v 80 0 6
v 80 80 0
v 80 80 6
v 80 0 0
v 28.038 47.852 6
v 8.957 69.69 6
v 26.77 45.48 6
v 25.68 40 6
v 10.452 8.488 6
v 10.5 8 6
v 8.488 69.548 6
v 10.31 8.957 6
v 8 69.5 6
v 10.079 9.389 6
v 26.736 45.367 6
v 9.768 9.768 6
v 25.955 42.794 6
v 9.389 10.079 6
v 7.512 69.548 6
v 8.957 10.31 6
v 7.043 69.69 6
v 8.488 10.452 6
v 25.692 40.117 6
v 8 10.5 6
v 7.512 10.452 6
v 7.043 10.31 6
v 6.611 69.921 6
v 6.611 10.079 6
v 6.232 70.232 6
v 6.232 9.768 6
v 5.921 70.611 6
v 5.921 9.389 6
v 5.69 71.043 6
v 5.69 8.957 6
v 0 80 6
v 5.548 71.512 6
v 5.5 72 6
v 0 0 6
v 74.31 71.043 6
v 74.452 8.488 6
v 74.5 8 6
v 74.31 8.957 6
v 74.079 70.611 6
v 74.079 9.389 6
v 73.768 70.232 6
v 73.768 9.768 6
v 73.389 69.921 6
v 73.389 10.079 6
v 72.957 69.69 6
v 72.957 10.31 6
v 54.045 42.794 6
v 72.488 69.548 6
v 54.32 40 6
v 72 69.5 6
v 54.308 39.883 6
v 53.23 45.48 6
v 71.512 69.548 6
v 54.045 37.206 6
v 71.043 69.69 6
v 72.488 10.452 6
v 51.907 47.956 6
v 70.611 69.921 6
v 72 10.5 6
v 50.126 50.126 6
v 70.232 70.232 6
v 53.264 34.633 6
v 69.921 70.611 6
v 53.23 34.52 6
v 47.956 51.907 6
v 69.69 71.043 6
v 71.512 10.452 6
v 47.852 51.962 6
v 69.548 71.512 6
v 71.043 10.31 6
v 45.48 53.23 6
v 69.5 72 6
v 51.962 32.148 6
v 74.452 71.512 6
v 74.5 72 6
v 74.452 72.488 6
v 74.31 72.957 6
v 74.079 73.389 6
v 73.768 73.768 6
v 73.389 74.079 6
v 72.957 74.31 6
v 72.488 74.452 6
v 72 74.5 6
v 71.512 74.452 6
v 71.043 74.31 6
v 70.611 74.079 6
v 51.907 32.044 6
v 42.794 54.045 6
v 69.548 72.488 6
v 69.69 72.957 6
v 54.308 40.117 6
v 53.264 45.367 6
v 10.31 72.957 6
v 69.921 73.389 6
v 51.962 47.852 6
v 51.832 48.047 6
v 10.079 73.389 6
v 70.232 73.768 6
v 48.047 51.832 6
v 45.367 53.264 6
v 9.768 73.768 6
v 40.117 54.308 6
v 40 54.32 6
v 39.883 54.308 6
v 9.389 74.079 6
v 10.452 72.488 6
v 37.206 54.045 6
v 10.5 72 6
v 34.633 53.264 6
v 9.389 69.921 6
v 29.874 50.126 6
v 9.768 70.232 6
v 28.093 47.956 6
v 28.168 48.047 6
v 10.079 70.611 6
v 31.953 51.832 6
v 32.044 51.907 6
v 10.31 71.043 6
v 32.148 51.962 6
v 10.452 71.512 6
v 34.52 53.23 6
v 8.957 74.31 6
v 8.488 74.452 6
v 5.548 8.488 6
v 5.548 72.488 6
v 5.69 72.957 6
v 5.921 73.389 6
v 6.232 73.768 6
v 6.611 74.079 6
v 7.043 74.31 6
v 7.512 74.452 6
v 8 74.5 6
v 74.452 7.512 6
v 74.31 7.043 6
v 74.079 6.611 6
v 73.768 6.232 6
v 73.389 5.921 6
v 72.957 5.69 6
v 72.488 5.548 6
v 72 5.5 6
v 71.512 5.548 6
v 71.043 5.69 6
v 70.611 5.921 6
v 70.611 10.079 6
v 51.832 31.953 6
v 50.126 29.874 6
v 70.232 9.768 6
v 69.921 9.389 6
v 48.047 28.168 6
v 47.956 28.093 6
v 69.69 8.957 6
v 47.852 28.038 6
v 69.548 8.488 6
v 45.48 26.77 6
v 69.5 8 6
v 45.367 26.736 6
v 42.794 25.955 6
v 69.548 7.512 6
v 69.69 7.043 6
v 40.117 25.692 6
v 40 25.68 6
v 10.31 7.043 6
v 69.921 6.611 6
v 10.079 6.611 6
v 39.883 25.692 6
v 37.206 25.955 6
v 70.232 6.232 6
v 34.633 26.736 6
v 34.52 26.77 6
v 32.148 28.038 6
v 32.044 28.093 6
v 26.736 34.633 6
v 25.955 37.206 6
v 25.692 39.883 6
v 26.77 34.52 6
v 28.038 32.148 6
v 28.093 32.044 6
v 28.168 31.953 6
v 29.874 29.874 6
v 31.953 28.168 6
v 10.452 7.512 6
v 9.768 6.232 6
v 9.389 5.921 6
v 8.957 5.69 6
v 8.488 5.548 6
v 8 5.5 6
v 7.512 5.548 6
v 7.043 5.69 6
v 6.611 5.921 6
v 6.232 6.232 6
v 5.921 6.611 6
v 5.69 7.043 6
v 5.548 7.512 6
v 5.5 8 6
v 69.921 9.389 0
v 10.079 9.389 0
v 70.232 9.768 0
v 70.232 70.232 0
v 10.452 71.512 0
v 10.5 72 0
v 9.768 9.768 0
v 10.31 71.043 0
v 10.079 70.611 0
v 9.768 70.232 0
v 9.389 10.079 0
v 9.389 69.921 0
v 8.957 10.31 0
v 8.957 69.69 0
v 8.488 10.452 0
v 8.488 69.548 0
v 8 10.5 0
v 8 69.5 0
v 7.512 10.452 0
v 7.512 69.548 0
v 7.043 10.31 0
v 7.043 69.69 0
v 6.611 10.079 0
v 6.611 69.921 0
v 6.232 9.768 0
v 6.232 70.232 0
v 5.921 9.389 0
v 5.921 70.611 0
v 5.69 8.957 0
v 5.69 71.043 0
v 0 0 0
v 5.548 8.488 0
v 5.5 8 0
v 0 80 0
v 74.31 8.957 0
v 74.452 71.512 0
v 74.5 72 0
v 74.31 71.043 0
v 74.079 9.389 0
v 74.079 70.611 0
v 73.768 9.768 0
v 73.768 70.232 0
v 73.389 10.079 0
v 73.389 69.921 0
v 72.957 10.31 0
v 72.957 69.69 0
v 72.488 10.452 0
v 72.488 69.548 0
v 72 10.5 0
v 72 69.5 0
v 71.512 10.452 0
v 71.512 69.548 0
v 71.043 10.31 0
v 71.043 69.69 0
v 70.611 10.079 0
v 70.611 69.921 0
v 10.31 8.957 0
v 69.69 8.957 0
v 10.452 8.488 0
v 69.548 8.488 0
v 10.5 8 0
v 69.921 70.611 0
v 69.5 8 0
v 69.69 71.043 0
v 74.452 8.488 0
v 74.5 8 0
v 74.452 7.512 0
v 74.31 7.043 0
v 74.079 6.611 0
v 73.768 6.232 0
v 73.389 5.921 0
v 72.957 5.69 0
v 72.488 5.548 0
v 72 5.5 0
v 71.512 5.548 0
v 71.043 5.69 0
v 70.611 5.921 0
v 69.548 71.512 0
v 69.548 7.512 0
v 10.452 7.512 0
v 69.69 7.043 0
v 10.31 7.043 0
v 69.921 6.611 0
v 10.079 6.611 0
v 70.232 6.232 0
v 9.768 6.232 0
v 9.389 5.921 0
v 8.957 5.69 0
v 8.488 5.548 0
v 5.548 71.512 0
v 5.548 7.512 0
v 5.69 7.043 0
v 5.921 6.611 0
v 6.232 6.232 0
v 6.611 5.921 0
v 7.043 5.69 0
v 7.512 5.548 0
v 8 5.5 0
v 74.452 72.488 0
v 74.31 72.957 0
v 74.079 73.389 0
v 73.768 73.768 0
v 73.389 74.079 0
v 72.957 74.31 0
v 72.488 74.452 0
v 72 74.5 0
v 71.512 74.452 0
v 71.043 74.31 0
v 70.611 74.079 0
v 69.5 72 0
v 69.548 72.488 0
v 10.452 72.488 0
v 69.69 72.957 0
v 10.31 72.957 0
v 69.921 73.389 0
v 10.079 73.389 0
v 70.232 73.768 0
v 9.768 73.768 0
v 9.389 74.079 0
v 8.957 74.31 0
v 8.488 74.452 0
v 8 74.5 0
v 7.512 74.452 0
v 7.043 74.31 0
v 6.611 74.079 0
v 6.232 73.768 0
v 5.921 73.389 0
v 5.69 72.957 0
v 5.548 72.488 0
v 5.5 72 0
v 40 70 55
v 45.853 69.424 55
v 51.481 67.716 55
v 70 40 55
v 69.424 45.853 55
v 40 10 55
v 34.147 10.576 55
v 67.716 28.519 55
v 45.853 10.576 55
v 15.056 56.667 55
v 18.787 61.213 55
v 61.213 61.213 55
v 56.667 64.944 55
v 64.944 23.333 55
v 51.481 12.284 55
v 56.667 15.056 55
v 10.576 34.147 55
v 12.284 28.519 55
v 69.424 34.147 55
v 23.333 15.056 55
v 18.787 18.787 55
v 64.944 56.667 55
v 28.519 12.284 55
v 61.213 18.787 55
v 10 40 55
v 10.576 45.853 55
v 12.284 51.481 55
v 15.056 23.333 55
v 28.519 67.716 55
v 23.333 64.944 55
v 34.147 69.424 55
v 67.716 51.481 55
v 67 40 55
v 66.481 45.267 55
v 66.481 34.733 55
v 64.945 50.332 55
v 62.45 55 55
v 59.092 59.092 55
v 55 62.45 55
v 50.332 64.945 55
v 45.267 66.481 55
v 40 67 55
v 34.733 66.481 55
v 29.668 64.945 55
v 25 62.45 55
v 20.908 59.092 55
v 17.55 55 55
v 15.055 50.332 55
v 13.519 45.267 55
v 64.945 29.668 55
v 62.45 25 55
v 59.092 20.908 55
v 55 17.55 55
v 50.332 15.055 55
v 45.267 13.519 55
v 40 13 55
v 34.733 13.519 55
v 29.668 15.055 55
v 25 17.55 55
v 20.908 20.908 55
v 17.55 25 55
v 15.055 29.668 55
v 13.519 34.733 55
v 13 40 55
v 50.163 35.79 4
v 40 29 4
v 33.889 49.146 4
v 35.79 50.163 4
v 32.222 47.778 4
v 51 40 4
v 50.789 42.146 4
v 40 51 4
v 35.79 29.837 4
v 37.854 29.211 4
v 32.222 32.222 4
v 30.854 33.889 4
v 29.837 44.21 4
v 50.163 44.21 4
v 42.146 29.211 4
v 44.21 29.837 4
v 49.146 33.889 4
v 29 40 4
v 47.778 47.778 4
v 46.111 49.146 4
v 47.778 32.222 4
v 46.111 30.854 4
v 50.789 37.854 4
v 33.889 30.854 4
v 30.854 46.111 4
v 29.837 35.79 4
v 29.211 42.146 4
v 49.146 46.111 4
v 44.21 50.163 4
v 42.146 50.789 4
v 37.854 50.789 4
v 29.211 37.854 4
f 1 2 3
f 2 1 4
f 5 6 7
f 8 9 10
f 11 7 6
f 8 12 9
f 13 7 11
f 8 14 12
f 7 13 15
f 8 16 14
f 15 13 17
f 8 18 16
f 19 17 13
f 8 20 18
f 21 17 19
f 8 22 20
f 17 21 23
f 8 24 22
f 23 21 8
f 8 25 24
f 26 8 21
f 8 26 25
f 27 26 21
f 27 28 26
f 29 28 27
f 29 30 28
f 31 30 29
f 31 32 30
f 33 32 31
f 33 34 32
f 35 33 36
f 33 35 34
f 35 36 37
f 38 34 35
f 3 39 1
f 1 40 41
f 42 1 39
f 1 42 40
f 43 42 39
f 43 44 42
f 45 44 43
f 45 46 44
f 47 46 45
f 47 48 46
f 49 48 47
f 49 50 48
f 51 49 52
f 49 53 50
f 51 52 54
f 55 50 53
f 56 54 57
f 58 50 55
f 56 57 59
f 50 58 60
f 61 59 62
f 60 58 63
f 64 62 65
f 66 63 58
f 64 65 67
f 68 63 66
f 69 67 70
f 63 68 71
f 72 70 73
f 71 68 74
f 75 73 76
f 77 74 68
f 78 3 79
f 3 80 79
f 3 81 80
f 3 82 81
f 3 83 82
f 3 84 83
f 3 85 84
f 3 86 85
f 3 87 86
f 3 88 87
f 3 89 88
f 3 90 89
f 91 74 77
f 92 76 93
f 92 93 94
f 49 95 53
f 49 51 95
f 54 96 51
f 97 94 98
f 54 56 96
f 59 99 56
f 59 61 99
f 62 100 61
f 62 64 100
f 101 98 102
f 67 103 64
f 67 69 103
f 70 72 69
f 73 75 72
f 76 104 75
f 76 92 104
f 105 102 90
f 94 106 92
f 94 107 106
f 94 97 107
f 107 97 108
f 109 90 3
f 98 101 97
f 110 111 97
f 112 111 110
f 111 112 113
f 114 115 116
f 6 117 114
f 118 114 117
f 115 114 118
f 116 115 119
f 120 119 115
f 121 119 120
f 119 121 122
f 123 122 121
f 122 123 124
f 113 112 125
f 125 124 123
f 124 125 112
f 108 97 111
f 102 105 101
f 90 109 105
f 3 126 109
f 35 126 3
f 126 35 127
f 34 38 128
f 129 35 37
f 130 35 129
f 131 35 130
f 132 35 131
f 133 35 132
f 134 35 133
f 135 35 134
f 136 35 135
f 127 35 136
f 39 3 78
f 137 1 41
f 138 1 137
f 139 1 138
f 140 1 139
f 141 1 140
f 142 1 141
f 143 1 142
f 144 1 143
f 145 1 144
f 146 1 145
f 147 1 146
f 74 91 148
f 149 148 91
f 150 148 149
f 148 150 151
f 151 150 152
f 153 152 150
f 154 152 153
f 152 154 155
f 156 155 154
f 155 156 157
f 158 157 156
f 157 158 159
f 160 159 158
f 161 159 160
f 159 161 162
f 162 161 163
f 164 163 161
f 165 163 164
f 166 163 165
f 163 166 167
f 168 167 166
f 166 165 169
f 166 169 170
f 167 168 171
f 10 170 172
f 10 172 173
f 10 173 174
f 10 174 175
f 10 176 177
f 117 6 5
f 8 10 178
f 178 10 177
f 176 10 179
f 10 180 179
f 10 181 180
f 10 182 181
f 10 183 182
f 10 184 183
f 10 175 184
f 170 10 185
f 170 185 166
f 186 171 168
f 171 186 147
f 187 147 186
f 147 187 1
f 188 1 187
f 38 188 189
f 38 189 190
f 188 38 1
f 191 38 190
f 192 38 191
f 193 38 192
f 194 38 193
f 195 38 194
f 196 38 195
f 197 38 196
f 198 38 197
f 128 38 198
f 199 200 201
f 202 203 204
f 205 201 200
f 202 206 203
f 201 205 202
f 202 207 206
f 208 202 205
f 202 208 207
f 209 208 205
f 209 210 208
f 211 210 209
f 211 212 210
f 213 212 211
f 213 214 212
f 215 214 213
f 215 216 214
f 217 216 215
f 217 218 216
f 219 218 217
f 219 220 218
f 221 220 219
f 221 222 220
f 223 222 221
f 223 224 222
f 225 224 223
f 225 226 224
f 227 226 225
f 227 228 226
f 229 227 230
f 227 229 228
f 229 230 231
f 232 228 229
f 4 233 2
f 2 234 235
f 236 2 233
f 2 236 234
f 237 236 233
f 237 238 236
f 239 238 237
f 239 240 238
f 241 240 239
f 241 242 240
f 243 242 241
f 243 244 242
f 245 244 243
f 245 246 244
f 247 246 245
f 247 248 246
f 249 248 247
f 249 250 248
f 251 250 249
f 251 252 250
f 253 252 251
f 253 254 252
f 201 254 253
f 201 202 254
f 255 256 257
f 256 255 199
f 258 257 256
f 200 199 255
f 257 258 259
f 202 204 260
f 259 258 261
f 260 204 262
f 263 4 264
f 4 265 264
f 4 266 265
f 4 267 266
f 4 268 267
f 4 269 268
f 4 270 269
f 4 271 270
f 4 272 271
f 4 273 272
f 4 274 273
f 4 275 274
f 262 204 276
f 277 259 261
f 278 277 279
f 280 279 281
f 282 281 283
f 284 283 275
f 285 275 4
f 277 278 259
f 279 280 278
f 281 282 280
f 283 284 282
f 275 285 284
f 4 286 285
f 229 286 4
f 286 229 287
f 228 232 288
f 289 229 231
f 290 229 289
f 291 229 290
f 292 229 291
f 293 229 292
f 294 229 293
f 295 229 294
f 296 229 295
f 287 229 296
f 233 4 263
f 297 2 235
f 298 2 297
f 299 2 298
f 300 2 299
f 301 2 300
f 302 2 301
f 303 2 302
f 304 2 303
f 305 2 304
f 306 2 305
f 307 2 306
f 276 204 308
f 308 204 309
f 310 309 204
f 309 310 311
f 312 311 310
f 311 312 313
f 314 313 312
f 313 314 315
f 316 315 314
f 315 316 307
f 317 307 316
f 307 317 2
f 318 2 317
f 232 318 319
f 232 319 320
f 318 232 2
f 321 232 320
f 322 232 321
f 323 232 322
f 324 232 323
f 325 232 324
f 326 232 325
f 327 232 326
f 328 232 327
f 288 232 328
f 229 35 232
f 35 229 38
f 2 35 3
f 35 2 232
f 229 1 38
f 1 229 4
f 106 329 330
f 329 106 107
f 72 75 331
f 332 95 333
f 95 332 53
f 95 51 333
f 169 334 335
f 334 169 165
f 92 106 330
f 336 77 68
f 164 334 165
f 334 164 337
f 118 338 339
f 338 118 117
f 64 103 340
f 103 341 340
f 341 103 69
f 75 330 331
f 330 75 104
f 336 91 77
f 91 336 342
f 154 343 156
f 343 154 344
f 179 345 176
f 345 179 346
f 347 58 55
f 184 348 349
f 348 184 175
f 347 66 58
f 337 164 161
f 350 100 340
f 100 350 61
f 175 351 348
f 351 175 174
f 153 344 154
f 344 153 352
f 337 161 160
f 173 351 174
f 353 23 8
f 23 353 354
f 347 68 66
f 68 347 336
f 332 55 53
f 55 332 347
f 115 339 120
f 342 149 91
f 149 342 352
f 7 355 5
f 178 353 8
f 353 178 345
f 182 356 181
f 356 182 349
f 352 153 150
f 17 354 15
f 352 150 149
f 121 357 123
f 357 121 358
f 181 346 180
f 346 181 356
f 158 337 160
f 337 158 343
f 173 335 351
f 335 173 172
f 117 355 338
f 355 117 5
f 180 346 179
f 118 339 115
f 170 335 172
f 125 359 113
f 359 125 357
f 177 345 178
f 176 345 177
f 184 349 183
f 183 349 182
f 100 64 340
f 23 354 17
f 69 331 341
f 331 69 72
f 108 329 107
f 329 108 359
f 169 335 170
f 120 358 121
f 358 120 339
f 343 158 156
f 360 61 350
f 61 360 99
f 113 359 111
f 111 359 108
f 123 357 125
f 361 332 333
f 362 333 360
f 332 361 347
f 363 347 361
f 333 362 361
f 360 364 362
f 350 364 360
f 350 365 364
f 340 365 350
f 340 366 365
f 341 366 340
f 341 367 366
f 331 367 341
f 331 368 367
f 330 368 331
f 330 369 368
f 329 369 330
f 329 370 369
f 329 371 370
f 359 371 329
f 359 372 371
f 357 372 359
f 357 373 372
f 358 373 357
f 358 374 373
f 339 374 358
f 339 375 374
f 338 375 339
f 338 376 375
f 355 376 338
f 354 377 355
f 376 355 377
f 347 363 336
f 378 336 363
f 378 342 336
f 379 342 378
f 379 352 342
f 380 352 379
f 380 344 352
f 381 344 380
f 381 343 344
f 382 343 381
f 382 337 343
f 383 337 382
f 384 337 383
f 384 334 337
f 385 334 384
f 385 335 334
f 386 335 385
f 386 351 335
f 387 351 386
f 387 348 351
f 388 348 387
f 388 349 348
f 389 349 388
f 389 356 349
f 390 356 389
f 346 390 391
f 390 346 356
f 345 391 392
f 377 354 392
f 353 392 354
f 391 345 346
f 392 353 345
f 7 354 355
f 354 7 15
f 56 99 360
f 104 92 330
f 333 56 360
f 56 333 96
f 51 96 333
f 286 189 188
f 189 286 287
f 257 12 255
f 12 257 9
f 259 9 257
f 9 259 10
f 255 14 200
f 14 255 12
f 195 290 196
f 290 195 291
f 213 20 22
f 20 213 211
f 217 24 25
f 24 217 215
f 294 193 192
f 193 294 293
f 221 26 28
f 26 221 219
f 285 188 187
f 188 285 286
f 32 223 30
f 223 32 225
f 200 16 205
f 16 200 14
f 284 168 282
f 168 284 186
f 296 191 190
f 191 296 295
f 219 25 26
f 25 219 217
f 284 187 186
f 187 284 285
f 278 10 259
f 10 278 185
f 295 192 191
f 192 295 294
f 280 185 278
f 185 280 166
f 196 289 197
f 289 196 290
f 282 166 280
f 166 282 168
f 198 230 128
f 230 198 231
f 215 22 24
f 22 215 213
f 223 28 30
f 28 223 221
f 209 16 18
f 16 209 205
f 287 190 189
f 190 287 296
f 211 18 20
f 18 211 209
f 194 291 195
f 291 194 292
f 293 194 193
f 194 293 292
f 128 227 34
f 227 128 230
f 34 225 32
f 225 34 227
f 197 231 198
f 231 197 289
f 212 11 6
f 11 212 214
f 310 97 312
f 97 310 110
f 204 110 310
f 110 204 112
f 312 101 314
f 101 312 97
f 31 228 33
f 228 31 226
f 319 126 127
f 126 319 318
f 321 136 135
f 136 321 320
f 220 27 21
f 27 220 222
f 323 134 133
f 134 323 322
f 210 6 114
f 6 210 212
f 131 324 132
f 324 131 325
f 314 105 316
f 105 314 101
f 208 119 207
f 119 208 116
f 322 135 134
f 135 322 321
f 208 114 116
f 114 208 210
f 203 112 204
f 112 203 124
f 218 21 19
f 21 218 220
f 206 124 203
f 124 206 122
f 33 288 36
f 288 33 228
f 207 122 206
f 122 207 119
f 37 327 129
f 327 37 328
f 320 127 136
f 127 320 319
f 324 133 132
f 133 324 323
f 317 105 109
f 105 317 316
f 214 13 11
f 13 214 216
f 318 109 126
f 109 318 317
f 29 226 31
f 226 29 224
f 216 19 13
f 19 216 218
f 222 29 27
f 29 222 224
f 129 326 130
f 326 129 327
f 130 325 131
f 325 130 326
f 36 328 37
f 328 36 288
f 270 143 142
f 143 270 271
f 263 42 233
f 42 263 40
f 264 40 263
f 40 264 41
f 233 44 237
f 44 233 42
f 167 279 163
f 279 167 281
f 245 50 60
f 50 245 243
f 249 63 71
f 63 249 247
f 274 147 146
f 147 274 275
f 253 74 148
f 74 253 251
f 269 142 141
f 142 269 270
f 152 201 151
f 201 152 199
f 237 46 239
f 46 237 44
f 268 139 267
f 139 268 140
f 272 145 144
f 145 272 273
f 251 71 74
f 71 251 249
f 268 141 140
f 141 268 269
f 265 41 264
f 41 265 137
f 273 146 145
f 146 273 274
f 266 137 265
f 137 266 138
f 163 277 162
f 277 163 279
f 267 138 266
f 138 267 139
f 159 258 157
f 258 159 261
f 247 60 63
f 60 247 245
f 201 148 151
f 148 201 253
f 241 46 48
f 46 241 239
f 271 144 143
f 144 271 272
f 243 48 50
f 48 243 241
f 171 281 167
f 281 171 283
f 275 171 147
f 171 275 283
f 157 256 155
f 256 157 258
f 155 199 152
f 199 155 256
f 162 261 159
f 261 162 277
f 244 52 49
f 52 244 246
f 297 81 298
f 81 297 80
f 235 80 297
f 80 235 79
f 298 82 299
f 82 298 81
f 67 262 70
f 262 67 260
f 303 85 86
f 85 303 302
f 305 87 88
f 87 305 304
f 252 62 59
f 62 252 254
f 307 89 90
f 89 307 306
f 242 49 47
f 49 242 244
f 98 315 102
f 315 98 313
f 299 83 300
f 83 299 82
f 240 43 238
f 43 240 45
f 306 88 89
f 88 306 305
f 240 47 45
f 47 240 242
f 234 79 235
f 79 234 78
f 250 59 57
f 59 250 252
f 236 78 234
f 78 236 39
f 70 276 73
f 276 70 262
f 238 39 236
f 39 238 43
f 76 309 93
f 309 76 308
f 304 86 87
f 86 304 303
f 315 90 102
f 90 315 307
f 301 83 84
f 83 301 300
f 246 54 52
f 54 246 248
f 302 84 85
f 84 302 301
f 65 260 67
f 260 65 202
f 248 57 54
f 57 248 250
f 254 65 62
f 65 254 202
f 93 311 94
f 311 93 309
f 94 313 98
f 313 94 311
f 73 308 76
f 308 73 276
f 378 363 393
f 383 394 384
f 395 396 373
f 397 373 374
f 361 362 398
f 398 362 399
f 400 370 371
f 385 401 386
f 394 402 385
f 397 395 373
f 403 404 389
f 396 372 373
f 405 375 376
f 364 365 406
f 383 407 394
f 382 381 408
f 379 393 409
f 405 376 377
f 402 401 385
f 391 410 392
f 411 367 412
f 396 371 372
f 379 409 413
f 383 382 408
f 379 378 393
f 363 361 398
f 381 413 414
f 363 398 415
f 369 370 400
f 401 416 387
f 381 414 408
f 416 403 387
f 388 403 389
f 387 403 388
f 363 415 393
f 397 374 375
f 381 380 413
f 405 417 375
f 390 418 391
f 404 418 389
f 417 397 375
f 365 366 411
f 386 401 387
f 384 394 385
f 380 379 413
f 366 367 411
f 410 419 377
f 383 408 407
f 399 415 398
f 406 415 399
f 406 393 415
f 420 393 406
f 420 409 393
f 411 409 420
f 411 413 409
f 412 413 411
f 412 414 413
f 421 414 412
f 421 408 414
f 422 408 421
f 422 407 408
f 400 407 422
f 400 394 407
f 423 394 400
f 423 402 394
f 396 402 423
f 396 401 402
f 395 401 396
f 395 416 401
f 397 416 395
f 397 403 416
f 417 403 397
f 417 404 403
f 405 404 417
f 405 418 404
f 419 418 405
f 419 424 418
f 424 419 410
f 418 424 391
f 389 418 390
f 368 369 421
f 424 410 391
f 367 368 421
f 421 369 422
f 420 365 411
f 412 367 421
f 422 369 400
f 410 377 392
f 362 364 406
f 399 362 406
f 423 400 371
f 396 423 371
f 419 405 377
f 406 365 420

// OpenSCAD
$fn = 32;

// ----------------------------------------------------------------------
// Hopper: flanged with square flange
// ----------------------------------------------------------------------

// --- parameters (mm) ---
fl = 80;                  // flange side, X and Y
fl_t = 6;                 // flange thickness
cone_h = 50;              // cone height above the flange
top_d = 60;               // cone mouth diameter
bot_d = 28;               // cone spout diameter
wall = 3;                 // cone wall thickness
hole_r = 2.5;             // flange hole radius
hole_in = 8;              // hole inset from the corners

bore_d = bot_d - 2 * wall;  // spout bore diameter
total_h = fl_t + cone_h - 1;  // overall height

difference() {
  union() {
    cube([fl, fl, fl_t]);
    translate([fl / 2, fl / 2, fl_t - 1])
      cylinder(h = cone_h, d1 = bot_d, d2 = top_d);
  }
  translate([fl / 2, fl / 2, fl_t - 2])
    cylinder(h = cone_h + 1, d1 = bore_d, d2 = top_d - 2 * wall);
  for (sx = [0, 1], sy = [0, 1])
    translate([sx ? fl - hole_in : hole_in,
               sy ? fl - hole_in : hole_in, -1])
      cylinder(r = hole_r, h = fl_t + 2);
}
